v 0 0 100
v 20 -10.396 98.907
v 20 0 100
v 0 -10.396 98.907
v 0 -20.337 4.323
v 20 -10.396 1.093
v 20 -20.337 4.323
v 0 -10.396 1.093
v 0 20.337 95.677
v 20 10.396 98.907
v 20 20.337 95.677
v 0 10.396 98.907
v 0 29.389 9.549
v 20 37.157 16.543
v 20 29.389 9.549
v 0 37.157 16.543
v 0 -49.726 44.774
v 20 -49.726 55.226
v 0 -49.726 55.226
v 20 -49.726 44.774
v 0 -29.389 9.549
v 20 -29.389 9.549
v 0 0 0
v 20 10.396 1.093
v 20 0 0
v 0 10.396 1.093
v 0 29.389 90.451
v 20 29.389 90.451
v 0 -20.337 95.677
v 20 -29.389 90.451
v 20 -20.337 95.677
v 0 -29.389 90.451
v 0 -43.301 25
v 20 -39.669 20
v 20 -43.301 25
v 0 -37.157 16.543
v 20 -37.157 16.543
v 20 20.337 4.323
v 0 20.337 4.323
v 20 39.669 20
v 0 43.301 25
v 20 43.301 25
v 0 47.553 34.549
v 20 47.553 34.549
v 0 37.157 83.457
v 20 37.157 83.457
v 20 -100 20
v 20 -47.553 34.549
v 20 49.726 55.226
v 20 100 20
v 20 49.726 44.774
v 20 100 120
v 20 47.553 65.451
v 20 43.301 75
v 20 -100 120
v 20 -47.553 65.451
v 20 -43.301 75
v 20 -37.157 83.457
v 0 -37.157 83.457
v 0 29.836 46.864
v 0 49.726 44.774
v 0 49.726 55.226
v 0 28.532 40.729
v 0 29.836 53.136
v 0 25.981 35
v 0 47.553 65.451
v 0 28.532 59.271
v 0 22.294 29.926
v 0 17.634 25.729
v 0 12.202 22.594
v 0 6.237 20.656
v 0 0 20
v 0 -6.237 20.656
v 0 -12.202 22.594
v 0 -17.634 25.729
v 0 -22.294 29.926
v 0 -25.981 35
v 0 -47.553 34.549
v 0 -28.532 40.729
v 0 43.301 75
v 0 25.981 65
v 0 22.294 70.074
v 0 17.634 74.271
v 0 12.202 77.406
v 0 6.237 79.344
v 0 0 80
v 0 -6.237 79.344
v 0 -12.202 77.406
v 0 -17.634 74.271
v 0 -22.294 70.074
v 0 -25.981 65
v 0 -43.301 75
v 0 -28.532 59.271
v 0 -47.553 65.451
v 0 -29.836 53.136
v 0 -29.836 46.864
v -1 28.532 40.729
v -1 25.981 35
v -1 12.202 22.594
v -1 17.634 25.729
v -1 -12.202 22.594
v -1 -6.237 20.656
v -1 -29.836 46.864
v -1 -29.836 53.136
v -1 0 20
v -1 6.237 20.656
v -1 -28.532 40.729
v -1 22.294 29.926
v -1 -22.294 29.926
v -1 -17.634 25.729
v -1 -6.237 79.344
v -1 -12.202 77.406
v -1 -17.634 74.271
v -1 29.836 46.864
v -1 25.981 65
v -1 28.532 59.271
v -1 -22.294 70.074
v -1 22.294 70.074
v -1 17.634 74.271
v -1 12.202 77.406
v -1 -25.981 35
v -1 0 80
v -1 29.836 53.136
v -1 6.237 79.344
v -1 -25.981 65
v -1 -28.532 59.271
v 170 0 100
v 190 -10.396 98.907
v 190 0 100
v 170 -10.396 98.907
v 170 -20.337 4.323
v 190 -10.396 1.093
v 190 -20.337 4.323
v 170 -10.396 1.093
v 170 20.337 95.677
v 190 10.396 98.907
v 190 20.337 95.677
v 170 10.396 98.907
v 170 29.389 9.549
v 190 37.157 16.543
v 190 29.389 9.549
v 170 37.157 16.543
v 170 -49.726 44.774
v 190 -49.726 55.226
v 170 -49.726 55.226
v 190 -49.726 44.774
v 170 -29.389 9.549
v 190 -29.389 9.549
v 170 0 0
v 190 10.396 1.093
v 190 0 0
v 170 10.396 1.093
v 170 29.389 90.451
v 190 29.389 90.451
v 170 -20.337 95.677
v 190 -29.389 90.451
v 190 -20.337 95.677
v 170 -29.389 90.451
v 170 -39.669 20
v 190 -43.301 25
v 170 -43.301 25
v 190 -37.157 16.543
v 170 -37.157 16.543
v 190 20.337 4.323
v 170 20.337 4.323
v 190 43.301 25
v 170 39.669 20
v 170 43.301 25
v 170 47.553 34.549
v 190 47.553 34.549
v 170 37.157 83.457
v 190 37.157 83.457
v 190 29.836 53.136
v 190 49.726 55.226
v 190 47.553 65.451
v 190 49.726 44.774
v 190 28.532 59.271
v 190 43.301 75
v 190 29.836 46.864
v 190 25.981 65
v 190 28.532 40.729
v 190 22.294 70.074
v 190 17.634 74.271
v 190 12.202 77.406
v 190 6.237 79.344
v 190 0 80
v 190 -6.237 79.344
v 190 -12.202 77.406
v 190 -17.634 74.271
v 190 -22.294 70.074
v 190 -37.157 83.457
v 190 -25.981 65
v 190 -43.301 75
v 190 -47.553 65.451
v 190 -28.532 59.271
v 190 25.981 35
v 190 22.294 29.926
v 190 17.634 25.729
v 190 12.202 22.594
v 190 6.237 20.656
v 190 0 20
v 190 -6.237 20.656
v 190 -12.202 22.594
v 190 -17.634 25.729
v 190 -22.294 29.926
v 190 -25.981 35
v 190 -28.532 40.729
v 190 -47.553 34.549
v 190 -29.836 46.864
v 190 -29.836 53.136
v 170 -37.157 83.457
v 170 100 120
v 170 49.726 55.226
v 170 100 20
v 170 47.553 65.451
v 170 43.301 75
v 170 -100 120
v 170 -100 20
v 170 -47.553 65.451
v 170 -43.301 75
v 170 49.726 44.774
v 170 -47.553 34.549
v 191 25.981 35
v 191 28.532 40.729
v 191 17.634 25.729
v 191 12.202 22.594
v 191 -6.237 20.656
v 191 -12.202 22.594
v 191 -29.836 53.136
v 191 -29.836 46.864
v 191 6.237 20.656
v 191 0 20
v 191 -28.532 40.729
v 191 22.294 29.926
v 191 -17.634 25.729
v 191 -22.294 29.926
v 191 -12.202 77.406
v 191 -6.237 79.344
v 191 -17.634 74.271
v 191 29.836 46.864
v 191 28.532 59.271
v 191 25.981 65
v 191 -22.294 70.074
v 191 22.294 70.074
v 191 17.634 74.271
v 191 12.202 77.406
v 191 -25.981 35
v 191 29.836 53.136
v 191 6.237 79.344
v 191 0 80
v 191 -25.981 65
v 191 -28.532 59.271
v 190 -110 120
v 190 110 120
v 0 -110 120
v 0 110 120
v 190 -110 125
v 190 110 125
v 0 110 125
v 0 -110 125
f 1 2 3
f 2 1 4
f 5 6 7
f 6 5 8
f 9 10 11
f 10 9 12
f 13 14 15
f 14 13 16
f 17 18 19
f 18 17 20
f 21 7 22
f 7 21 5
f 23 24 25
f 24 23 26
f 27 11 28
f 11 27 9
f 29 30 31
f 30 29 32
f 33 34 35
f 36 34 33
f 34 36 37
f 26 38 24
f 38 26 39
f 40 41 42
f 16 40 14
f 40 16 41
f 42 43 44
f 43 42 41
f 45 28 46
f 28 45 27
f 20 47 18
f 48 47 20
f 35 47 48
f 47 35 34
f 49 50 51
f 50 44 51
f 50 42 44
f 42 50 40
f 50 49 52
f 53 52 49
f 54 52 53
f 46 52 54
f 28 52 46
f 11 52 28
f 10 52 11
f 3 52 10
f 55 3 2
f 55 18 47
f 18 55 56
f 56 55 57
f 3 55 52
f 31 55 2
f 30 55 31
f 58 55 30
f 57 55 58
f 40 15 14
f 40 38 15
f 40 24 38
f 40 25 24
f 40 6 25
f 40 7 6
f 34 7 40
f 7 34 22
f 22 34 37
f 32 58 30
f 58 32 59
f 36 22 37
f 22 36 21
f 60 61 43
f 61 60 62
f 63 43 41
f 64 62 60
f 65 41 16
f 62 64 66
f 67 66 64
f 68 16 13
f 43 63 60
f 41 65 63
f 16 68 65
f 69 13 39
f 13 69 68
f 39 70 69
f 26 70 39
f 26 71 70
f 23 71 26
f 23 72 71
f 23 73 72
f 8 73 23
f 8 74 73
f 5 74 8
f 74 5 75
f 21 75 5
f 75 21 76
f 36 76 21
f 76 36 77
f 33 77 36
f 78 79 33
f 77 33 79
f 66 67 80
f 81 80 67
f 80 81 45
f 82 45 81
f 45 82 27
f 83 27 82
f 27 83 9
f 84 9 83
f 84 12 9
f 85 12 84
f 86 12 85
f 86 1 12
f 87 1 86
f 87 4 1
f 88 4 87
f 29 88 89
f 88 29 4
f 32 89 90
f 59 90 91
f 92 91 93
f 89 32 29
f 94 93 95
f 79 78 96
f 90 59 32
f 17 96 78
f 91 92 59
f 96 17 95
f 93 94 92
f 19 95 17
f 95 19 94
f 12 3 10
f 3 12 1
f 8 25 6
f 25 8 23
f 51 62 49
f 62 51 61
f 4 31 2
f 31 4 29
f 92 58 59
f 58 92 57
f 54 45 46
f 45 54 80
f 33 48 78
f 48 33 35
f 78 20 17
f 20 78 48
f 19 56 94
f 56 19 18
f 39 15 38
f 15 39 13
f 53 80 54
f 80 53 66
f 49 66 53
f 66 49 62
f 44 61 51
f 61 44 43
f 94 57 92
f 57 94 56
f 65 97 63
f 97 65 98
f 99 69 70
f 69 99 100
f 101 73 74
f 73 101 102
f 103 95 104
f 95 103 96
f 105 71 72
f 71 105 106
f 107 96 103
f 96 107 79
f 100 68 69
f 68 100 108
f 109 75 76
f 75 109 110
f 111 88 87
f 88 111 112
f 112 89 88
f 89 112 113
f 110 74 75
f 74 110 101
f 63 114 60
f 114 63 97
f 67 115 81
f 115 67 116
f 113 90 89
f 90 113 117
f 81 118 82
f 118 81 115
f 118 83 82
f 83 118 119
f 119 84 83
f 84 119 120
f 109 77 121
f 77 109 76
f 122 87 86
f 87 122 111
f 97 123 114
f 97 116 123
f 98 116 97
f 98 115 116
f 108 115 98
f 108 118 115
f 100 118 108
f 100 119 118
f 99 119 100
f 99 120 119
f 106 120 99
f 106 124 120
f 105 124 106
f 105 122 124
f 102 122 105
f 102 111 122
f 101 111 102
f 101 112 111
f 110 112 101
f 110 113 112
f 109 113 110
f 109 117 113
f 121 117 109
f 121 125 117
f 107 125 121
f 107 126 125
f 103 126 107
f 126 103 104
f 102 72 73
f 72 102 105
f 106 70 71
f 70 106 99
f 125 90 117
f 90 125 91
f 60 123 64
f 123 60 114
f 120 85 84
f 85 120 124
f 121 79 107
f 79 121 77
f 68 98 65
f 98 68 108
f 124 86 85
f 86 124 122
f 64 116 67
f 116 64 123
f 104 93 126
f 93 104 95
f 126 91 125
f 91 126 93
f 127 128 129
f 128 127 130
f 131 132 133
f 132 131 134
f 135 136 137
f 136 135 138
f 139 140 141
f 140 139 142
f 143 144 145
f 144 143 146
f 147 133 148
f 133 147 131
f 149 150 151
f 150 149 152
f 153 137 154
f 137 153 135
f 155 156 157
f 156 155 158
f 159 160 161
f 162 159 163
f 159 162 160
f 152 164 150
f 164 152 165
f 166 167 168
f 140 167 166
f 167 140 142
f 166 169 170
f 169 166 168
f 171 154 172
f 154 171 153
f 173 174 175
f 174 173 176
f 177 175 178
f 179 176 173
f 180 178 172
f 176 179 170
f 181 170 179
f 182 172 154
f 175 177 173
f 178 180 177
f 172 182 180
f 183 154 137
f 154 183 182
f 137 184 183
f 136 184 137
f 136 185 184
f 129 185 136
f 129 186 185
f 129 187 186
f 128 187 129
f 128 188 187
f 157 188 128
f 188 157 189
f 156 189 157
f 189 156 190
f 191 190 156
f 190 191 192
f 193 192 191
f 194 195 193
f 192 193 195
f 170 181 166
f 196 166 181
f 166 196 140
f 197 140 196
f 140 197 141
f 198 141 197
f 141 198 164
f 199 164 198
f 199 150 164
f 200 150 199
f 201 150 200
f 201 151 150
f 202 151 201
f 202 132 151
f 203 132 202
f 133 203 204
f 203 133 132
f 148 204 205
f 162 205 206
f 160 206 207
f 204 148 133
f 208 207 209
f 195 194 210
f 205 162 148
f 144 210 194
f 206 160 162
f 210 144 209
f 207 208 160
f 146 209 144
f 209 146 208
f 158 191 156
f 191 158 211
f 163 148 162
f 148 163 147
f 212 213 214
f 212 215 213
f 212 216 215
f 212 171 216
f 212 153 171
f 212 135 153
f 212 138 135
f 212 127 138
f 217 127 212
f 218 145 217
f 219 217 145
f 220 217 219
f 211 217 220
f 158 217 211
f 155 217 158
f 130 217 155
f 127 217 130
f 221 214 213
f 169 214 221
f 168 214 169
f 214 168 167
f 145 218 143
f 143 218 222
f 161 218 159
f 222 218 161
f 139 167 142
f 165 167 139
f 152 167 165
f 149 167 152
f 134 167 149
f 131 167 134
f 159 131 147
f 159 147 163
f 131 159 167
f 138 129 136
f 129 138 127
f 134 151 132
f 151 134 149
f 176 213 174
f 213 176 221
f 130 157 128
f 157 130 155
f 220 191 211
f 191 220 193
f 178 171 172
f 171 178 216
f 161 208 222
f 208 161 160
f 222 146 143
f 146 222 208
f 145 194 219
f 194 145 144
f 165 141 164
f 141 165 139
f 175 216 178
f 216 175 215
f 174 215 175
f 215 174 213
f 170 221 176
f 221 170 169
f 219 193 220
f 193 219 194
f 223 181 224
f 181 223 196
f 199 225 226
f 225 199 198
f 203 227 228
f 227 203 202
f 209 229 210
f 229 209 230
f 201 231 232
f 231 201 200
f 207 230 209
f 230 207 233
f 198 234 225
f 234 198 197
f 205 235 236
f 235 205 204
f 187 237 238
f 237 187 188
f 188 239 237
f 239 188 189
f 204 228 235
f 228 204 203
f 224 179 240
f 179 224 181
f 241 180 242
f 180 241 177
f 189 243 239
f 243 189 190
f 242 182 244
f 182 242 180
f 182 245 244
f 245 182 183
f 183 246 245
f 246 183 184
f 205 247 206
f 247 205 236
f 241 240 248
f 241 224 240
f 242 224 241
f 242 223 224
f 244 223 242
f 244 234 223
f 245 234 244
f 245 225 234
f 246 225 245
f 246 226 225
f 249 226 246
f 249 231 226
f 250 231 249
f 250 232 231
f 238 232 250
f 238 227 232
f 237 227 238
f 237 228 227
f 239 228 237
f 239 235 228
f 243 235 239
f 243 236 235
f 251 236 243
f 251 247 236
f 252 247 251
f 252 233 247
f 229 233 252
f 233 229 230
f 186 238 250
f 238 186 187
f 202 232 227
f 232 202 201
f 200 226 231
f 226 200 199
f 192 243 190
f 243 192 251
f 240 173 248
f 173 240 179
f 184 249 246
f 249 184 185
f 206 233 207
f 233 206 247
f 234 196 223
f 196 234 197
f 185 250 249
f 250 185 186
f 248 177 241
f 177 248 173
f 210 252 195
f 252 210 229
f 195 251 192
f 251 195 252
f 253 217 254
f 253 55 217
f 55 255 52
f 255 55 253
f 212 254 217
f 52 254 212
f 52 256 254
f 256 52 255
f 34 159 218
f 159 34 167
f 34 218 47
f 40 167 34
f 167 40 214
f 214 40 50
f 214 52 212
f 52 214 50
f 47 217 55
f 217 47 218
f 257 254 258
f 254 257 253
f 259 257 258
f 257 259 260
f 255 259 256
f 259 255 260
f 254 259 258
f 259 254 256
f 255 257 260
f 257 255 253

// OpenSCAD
// ====================================================================
//  Private
// ====================================================================

module roda() {
    color("black") translate([0,0,50]) rotate([0,90,0]) cylinder(h=20,r=50);
    color("gold") translate([-1,0,50]) rotate([0,90,0]) cylinder(h=22,r=30);
}

// ====================================================================
//  Public
// ====================================================================

module base_pioneer_p3dx() {
    // Corpo
    color("red") translate([20,-100,20]) cube([150,200,100]);
    color("black") translate([0,-110,120]) cube([190,220,5]);

    // Rodas
    translate([  0, 0, 0]) roda();
    translate([170, 0, 0]) roda();
}

// ====================================================================
//  Example
// ====================================================================

base_pioneer_p3dx();
